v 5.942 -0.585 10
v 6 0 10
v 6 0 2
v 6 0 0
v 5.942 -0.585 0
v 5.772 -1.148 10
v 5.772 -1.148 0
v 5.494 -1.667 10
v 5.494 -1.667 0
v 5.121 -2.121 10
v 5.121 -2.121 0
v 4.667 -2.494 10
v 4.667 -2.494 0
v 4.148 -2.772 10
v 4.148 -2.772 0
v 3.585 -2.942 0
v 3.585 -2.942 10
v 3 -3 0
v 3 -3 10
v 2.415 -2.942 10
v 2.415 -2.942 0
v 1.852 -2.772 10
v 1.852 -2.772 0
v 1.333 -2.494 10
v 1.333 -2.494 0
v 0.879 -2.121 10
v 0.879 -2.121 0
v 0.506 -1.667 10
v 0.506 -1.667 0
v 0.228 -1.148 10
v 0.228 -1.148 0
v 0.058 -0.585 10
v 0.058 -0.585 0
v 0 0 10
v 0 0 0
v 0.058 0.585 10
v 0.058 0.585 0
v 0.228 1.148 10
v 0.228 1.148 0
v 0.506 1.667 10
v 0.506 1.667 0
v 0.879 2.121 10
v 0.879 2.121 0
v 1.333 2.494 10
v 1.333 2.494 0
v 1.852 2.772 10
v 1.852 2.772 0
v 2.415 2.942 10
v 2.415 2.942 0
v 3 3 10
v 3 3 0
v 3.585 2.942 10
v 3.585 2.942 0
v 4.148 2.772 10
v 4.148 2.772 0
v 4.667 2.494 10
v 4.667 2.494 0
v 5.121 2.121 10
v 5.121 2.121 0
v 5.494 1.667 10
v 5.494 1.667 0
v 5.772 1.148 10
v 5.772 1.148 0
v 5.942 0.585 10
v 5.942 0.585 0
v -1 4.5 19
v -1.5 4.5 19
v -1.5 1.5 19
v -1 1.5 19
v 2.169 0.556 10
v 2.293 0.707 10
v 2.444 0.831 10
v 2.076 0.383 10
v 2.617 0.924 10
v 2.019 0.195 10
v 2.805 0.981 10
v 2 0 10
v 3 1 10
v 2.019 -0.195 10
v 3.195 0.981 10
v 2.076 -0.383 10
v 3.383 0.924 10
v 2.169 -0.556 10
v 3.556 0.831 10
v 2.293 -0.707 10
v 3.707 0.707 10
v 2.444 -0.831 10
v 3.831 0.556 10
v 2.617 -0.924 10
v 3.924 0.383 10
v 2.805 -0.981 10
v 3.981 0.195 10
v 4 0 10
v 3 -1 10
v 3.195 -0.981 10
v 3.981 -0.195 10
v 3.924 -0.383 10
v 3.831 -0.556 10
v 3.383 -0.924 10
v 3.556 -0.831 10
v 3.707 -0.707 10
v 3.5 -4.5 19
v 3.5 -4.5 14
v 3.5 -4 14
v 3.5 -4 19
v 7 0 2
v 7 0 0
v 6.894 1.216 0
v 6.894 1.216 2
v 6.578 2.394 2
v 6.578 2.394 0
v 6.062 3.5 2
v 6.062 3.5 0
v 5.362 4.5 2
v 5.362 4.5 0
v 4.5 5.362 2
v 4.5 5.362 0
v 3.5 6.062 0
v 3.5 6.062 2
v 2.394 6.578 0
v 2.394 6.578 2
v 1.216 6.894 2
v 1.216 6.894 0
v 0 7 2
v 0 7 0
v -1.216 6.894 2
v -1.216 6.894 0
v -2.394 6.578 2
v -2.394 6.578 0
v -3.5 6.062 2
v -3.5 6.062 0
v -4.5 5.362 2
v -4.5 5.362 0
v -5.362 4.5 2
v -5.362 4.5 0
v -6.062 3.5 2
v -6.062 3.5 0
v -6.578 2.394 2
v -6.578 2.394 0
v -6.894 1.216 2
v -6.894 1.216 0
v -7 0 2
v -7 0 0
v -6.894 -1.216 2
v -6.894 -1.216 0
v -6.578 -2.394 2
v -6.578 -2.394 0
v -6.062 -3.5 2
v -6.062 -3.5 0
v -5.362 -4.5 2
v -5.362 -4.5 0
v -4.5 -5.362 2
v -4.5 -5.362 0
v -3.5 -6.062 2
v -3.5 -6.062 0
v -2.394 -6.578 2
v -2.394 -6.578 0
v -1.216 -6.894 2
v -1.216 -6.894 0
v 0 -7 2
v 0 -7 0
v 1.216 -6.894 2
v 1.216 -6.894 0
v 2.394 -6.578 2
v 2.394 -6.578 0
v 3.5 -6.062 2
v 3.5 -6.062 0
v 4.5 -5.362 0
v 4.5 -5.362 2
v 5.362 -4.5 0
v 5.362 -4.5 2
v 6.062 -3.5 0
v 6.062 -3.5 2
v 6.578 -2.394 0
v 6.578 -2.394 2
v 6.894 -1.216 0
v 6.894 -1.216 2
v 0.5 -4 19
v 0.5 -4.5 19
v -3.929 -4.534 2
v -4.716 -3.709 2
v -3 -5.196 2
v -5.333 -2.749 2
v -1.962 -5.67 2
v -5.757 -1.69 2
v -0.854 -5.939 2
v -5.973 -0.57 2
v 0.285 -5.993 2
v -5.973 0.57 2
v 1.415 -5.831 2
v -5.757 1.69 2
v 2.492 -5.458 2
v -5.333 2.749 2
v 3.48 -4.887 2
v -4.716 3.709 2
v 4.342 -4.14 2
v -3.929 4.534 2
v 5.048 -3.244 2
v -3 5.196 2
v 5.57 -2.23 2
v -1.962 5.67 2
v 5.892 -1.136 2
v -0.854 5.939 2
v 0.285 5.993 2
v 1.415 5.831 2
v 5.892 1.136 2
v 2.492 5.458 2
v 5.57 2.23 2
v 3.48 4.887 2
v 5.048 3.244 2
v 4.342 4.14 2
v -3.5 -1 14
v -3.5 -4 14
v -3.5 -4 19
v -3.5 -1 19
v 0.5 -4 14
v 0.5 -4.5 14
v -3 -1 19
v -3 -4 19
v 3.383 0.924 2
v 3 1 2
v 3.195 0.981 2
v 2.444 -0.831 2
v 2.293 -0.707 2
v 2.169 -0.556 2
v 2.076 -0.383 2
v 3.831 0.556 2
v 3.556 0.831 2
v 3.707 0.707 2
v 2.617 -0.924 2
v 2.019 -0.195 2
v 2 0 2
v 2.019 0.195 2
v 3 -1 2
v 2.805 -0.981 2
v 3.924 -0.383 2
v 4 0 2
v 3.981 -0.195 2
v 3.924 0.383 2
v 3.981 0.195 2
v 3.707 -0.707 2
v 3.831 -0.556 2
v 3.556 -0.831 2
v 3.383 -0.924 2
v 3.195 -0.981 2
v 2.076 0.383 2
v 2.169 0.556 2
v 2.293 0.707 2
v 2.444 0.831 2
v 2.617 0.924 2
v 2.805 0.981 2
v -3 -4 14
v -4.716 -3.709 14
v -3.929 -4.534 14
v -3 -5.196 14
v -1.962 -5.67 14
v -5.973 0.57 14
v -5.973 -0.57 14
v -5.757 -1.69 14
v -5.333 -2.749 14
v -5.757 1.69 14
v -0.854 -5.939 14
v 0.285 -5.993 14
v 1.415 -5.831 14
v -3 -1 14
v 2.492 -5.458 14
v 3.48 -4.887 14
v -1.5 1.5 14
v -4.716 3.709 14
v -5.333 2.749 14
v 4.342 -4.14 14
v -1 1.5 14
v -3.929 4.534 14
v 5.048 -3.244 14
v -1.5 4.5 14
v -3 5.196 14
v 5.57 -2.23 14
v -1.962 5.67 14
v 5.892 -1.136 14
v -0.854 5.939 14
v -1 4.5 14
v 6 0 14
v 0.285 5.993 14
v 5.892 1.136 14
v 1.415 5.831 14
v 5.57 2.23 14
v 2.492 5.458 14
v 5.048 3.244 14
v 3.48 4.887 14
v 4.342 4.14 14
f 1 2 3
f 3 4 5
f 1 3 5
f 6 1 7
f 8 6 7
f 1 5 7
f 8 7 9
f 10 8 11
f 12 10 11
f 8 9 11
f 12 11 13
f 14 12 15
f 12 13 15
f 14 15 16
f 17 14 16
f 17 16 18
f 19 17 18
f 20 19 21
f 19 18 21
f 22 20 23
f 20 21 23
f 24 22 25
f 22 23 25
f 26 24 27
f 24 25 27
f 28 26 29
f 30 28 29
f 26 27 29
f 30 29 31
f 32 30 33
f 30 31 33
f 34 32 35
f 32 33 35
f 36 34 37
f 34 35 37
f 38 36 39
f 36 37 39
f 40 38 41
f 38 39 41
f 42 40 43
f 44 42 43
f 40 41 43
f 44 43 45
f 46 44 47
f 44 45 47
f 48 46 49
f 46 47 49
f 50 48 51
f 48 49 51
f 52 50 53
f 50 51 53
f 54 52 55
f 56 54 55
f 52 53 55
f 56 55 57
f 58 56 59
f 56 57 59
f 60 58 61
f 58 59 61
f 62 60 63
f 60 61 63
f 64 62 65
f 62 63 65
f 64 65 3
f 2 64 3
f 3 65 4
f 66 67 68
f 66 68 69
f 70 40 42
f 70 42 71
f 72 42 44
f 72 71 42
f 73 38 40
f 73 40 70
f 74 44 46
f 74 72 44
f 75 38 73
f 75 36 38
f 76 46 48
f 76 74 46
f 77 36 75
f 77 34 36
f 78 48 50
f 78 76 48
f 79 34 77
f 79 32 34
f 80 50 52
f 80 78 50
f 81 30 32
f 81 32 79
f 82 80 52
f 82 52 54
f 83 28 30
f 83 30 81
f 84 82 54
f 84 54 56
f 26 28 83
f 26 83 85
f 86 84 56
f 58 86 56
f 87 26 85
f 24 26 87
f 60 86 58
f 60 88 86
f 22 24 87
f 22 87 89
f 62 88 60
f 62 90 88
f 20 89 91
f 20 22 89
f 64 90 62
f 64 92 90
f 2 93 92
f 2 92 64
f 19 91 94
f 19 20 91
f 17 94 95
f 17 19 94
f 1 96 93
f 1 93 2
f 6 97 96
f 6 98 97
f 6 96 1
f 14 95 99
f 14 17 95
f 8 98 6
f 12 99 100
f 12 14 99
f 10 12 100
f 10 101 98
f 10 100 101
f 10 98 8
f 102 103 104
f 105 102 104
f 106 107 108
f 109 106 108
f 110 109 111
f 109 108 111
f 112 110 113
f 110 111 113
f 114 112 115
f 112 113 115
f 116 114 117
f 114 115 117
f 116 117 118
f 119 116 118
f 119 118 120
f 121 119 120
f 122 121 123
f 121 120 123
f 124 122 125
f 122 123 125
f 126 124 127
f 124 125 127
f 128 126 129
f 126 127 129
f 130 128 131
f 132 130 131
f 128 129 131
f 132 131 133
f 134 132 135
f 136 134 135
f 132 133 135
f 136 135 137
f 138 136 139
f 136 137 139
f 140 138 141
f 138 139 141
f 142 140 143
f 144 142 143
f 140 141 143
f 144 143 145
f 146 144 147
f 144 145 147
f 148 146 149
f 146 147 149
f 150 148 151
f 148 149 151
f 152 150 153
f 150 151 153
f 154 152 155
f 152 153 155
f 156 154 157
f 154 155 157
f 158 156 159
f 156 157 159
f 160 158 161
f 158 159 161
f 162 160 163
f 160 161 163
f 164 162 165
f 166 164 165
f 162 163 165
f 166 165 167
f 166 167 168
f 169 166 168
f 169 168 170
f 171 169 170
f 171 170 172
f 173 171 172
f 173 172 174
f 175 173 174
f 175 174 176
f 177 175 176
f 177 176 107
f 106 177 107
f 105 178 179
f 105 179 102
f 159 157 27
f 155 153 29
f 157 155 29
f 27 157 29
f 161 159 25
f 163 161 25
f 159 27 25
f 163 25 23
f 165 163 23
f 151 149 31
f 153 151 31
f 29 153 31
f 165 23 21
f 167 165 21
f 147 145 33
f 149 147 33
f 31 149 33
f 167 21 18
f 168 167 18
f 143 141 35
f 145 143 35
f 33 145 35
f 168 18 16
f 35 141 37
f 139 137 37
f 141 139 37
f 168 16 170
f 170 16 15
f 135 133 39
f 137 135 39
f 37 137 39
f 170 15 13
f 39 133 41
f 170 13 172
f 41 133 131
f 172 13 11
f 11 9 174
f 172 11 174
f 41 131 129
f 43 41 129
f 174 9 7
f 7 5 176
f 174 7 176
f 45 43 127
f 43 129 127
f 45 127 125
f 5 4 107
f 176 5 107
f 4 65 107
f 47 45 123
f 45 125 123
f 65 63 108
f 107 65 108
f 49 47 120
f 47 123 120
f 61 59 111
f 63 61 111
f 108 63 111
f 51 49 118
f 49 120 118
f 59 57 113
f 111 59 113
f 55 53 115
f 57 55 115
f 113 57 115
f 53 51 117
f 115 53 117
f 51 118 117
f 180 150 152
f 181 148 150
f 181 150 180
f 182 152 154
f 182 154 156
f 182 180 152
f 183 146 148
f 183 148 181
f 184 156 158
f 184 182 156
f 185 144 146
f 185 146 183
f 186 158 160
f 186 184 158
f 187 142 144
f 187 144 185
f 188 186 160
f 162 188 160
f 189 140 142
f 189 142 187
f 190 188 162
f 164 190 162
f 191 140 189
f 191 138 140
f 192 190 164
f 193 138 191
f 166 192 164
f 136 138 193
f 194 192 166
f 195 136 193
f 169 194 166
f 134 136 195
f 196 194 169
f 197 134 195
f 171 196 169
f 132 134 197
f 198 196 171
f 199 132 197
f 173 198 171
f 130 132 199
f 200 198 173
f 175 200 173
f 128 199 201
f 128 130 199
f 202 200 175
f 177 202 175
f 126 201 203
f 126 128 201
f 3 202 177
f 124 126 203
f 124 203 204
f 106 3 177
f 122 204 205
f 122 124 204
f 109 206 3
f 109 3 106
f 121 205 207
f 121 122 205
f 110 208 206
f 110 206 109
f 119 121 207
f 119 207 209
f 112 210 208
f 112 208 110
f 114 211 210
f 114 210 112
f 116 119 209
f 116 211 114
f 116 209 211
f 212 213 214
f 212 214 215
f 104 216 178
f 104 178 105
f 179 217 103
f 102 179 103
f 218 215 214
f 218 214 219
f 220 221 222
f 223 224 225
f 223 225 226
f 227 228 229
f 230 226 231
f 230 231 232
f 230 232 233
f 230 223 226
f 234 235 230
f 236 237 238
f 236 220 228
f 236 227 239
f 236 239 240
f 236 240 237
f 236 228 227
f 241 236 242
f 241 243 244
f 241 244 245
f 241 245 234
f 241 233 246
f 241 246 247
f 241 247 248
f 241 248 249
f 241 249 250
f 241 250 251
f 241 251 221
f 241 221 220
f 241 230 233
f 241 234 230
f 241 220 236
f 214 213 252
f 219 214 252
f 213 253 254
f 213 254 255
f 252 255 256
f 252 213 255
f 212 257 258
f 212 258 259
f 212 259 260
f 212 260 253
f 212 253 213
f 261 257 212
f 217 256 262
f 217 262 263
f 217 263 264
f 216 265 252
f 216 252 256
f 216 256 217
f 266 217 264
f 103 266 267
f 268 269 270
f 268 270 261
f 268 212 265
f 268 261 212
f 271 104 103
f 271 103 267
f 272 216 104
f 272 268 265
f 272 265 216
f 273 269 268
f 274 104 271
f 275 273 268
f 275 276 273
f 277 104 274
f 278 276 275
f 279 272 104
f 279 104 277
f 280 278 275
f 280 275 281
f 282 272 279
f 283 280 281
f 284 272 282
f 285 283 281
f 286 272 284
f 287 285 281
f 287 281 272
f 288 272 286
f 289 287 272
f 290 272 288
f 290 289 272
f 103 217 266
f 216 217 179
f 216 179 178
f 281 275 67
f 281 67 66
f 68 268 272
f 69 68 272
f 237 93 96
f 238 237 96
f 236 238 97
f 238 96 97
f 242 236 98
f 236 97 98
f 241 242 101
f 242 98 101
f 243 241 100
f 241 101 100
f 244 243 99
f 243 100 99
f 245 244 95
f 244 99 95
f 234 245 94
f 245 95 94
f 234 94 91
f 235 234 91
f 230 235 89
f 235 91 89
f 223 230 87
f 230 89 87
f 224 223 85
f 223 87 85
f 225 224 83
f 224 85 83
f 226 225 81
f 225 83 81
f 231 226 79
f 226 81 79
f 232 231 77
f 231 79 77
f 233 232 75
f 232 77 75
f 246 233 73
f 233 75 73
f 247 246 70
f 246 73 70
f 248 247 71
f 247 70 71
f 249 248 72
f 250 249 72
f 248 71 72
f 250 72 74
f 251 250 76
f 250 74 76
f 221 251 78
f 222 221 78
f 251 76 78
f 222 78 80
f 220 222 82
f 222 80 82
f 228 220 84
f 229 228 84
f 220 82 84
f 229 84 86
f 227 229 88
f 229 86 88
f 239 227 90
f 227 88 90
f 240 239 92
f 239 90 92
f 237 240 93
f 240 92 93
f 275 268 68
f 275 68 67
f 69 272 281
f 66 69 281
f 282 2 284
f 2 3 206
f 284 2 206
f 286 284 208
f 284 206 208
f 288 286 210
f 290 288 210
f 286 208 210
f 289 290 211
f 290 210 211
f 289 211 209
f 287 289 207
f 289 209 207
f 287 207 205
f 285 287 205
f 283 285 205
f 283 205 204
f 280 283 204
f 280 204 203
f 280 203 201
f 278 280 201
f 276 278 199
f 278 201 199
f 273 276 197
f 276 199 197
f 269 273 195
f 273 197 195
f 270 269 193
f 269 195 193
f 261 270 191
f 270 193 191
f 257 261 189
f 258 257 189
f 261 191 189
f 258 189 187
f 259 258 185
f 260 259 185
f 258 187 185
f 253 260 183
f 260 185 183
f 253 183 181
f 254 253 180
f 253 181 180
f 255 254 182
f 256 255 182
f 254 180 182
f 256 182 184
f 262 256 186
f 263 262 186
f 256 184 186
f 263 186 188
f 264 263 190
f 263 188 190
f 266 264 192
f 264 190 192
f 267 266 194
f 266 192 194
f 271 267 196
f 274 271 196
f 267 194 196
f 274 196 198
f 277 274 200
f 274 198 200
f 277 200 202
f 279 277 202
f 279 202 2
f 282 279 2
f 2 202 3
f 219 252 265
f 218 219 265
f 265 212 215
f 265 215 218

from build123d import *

# Parameters (mm, degrees)
SKETCH_R      = 7
PAD_DEPTH     = 2
SKETCH001_R   = 6
PAD001_DEPTH  = 12
SKETCH002_W   = 0.5
SKETCH002_H   = 3
SKETCH002_W_2 = 3
SKETCH002_H_2 = 0.5
PAD002_DEPTH  = 5
SKETCH003_R   = 3
POCKET_DEPTH  = 10
SKETCH004_R   = 1
PAD003_DEPTH  = 8


with BuildPart() as part:
    # Sketch → Pad (new body)
    with BuildSketch(Plane.XY):
        Circle(SKETCH_R)
    extrude(amount=PAD_DEPTH)

    # Sketch001 (on Face3 of Pad) → Pad001 (join)
    with BuildSketch(Plane.XY.offset(2)):
        Circle(SKETCH001_R)
    extrude(amount=PAD001_DEPTH)

    # Sketch002 (on Face5 of Pad001) → Pad002 (join)
    with BuildSketch(Plane.XY.offset(14)):
        with Locations((-1.25, 3)):
            Rectangle(SKETCH002_W, SKETCH002_H)
        with Locations((-3.25, -2.5)):
            Rectangle(SKETCH002_W, SKETCH002_H)
        with Locations((2, -4.25)):
            Rectangle(SKETCH002_W_2, SKETCH002_H_2)
    extrude(amount=PAD002_DEPTH)

    # Sketch003 (on Face2 of Pad002) → Pocket (cut)
    with BuildSketch(Plane(origin=(0, 0, 0), x_dir=(1, 0, 0), z_dir=(0, 0, -1))):
        with Locations((3, 0)):
            Circle(SKETCH003_R)
    extrude(amount=-POCKET_DEPTH, mode=Mode.SUBTRACT)

    # Sketch004 (on Face6 of Pocket) → Pad003 (join)
    with BuildSketch(Plane(origin=(0, 0, 10), x_dir=(1, 0, 0), z_dir=(0, 0, -1))):
        with Locations((3, 0)):
            Circle(SKETCH004_R)
    extrude(amount=PAD003_DEPTH)


solid = part.part
